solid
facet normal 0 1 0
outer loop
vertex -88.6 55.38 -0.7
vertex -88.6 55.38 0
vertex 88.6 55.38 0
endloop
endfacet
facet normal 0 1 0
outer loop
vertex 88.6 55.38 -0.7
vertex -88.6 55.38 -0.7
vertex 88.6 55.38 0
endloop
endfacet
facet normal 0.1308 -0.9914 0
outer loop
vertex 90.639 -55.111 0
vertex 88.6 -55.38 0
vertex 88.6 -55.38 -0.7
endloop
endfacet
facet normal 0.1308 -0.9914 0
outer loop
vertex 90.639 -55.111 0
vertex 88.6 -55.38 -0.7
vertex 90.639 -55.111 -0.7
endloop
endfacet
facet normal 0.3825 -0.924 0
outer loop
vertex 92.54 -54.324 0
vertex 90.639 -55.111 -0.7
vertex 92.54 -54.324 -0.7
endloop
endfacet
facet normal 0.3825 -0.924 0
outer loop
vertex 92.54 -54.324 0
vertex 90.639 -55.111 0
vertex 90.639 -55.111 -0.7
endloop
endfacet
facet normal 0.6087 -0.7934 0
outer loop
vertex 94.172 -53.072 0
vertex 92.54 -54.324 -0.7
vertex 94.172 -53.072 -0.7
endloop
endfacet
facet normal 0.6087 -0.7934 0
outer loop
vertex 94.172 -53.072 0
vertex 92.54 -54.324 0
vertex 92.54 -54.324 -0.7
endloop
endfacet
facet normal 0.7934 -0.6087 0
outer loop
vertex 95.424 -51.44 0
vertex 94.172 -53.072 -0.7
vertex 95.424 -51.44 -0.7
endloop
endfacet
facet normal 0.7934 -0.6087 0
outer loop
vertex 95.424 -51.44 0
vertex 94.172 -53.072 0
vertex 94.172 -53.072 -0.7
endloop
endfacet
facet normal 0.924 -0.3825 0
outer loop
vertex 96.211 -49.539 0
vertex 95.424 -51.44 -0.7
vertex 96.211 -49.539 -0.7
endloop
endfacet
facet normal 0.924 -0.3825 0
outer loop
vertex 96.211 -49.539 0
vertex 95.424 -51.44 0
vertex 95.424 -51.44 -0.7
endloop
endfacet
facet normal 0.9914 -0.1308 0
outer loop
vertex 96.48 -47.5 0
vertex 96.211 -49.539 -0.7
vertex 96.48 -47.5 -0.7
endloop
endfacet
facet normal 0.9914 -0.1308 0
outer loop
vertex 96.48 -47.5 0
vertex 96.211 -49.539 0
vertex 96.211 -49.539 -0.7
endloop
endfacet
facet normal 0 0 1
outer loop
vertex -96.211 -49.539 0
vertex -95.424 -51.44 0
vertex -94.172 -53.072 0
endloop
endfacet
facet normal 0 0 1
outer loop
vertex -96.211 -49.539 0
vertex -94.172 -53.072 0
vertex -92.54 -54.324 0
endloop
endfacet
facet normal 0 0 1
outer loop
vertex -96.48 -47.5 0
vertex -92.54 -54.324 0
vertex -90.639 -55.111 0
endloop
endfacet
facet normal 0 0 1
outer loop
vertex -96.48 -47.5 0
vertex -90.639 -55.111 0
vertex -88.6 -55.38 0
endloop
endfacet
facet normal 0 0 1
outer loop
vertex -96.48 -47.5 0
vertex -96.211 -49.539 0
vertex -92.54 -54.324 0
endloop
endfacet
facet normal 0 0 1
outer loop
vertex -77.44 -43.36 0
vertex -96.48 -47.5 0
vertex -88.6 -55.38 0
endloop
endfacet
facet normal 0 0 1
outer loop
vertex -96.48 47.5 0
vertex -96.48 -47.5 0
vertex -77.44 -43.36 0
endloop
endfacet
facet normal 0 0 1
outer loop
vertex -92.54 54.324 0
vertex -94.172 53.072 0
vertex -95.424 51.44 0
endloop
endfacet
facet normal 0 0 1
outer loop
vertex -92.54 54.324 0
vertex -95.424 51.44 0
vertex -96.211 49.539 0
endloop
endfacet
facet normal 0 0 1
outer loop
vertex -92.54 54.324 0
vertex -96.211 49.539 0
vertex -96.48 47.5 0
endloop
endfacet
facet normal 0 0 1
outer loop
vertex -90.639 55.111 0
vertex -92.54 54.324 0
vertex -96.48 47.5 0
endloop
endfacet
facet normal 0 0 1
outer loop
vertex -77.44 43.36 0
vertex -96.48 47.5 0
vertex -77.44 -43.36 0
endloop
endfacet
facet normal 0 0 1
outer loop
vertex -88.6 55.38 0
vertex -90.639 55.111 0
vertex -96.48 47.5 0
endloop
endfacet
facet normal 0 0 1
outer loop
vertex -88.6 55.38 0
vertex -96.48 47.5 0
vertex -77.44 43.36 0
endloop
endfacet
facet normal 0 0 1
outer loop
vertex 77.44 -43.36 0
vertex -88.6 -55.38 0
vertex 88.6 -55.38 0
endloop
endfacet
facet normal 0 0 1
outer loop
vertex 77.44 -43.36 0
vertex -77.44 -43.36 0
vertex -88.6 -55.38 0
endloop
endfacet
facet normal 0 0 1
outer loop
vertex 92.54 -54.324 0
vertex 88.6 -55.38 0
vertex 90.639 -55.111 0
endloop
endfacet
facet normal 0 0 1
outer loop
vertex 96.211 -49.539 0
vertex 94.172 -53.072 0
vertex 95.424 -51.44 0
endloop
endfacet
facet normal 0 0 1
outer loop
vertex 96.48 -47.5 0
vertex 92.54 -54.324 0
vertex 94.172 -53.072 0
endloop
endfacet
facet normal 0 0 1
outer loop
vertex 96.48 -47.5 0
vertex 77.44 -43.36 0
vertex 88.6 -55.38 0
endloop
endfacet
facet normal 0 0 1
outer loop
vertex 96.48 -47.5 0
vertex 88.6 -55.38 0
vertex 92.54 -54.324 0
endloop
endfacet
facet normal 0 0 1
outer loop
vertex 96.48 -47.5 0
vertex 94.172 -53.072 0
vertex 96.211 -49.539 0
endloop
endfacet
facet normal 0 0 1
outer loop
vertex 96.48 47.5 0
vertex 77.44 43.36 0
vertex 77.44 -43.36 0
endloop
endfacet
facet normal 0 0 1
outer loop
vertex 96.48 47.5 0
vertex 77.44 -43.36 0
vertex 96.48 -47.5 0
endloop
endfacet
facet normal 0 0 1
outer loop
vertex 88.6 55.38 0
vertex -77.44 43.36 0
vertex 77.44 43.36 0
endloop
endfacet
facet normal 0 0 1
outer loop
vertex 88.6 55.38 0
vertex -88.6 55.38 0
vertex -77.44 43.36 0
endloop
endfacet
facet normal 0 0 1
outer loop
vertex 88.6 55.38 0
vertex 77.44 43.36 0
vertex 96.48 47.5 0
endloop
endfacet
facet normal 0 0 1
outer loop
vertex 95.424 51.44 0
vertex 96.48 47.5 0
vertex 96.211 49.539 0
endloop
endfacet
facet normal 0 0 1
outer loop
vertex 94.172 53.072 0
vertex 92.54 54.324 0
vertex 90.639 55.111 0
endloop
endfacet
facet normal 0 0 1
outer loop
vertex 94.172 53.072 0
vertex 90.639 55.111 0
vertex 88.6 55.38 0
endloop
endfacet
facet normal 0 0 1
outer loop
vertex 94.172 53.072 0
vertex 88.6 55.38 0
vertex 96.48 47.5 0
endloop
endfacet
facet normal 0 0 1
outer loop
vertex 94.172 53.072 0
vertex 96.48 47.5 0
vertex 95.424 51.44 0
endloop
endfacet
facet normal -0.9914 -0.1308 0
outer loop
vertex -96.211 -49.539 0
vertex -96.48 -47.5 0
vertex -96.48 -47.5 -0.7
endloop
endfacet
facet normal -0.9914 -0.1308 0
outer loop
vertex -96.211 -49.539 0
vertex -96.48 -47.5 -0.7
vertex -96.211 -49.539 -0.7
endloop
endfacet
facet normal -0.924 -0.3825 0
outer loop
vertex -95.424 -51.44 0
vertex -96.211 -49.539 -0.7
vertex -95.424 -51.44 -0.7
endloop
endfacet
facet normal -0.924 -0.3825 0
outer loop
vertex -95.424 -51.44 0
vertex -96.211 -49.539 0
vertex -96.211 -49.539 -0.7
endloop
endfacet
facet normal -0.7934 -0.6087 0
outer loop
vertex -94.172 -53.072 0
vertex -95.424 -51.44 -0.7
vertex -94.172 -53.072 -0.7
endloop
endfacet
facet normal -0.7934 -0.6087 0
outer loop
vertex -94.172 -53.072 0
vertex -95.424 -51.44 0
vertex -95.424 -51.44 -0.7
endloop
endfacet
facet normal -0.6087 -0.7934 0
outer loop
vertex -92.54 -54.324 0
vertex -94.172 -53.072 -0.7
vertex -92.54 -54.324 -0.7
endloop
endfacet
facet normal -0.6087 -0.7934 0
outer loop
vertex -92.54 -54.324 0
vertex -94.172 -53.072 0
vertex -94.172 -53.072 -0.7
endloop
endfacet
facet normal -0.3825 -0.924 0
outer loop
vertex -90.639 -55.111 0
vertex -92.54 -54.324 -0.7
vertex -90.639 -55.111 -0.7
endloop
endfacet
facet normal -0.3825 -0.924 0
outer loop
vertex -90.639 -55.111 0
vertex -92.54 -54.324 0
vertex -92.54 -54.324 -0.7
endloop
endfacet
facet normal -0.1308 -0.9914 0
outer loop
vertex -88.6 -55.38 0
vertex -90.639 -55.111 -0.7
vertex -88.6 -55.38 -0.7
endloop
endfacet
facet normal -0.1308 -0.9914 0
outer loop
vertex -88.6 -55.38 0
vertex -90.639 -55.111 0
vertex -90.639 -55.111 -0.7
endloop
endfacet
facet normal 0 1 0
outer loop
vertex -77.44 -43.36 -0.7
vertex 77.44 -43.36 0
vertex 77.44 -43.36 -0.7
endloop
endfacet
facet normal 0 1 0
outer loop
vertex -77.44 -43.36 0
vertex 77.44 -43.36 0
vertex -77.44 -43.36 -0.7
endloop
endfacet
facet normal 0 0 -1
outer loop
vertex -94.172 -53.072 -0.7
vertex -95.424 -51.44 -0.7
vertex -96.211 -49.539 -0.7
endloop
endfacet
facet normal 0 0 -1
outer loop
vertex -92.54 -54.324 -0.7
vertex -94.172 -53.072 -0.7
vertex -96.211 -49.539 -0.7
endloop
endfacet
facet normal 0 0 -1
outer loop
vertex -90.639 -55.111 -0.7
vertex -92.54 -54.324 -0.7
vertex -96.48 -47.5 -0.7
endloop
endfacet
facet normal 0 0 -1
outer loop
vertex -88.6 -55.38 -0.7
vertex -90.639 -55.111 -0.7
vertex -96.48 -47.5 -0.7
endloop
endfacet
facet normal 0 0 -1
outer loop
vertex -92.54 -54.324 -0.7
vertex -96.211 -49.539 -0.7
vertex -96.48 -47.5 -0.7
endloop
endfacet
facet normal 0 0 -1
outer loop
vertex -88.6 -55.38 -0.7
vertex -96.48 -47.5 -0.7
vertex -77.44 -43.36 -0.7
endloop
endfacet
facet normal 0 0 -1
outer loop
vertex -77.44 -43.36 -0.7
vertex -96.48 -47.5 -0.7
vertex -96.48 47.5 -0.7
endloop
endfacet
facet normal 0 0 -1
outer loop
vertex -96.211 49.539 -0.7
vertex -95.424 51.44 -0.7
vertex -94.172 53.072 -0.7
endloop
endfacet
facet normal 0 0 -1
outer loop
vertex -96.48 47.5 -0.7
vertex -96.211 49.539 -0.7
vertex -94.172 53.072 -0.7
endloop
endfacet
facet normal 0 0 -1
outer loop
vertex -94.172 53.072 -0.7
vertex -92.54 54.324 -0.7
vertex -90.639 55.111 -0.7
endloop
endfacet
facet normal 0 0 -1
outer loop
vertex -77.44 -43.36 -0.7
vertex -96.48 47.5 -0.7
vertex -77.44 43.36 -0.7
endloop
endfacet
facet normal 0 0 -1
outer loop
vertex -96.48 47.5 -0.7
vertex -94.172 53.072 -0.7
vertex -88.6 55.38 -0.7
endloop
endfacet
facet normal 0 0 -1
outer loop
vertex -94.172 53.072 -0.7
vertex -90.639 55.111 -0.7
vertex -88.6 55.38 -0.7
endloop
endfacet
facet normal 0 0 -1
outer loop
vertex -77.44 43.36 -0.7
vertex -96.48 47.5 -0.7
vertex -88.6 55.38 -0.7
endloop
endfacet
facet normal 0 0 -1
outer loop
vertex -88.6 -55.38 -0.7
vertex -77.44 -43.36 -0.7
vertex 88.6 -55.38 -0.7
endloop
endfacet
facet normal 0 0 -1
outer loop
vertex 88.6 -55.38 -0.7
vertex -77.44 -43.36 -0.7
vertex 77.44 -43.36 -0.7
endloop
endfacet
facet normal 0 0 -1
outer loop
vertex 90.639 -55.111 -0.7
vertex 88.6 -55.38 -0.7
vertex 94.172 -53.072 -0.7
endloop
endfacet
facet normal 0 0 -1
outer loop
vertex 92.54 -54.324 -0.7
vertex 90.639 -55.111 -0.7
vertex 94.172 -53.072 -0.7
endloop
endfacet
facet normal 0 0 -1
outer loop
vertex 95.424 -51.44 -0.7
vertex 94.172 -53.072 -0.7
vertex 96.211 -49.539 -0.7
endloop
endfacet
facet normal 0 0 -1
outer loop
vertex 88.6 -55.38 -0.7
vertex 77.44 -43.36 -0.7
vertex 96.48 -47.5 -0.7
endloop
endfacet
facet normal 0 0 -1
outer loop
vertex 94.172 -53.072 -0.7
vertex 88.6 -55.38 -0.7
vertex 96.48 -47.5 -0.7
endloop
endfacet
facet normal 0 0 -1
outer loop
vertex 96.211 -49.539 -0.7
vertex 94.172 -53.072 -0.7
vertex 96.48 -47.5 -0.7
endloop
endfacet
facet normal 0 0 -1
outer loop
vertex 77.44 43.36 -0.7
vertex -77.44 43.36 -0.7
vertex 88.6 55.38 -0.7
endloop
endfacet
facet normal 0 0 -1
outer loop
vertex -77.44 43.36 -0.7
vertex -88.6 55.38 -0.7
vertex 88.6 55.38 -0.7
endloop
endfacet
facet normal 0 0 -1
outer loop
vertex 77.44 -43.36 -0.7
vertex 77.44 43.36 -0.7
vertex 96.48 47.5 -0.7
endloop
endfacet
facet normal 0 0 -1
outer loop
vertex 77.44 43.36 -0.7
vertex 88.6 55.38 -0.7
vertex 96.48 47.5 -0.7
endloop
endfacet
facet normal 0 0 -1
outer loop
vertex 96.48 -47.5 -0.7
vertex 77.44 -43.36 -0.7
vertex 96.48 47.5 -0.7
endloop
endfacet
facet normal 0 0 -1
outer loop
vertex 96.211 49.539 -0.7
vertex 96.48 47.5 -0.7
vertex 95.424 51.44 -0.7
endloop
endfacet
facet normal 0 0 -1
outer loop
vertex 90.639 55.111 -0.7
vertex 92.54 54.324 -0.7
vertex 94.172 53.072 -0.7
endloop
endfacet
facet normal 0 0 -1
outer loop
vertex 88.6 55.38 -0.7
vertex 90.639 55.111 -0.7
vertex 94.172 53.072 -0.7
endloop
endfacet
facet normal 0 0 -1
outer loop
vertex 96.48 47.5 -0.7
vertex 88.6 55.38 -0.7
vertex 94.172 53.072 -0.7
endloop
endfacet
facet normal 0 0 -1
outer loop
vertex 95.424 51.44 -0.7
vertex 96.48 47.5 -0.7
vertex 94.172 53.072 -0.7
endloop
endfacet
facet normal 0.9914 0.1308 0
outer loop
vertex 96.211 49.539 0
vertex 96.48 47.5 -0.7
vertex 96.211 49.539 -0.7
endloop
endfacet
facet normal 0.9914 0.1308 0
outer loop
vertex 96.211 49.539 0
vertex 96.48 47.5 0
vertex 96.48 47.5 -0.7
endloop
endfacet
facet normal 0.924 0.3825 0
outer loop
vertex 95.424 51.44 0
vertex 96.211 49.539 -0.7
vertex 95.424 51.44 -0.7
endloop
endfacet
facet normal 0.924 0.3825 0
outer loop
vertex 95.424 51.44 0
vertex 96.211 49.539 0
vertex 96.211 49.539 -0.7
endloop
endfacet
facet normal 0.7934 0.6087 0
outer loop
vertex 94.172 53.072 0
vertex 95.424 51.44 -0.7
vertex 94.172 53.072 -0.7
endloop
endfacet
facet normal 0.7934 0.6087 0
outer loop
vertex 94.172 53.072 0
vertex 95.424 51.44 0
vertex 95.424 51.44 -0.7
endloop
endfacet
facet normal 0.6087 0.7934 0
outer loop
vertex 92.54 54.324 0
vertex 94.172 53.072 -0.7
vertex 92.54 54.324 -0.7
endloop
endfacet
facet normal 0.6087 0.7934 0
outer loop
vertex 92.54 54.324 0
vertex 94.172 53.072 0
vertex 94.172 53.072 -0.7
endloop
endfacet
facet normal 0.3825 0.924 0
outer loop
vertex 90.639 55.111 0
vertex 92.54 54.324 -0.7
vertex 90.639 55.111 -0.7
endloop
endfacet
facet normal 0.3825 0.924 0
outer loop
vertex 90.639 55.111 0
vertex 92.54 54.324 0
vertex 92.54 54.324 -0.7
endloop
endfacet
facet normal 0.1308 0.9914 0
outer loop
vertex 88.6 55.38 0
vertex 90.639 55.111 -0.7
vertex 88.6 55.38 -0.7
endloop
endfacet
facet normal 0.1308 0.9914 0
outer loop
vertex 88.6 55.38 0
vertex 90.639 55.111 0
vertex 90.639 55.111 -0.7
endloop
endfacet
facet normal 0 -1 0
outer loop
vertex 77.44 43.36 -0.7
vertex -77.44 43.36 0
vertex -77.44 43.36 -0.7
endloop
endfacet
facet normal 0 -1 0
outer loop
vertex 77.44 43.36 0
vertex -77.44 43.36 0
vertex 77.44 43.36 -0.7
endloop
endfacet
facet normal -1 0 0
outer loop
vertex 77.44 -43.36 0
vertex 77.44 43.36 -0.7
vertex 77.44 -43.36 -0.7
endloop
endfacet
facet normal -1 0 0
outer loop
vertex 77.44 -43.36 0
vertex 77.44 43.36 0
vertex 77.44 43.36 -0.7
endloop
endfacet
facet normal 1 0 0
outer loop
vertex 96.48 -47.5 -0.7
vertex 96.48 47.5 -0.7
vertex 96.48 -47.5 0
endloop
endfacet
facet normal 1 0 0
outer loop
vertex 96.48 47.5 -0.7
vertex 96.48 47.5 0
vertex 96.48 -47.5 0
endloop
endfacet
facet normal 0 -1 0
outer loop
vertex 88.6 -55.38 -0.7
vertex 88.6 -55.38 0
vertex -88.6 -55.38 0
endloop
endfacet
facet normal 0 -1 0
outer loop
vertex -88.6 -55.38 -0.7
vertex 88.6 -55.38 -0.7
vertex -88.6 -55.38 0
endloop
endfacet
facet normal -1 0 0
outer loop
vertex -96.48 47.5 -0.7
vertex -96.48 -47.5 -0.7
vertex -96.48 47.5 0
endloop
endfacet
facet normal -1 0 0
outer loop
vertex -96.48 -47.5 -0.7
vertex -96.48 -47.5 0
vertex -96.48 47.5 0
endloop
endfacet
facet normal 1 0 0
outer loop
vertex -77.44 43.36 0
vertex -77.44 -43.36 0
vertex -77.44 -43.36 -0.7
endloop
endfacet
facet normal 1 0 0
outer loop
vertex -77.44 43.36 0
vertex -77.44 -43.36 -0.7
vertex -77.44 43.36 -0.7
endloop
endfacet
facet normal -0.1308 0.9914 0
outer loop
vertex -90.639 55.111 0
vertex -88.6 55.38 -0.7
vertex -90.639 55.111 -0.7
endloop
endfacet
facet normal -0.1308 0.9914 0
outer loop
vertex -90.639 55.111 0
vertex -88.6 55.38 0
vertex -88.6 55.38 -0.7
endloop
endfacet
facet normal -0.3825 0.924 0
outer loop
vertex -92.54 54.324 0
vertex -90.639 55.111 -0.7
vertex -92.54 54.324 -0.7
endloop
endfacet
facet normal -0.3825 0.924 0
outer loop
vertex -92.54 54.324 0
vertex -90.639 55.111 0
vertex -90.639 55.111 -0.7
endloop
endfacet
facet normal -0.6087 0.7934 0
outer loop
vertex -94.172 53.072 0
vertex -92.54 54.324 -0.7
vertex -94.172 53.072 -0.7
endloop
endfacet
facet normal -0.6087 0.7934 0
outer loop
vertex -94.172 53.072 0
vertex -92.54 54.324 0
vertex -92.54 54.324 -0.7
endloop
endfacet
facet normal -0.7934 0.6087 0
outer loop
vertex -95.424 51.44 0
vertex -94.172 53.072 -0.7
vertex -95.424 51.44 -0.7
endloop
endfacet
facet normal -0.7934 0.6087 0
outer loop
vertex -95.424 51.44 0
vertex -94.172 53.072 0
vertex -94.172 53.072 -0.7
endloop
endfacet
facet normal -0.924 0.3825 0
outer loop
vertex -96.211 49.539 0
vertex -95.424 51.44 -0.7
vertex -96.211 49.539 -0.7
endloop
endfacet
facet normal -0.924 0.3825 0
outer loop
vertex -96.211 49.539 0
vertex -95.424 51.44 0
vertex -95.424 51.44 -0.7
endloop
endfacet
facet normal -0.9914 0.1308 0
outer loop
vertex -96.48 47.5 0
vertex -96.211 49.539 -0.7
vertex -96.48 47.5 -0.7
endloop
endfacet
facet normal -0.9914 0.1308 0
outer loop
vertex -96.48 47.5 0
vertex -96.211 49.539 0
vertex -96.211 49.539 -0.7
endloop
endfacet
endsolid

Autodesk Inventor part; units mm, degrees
ref_plane "YZ Plane" through (0, 0, 0) normal (1, 0, 0) x (0, 1, 0)
ref_plane "XZ Plane" through (0, 0, 0) normal (0, 1, 0) x (-1, 0, 0)
ref_plane "XY Plane" through (0, 0, 0) normal (0, 0, 1) x (1, 0, 0)
sketch "Skizze1" plane through (0, 0, 0) normal (0, 0, 1) x (1, 0, 0)
  line L0 (-88.6, 55.38) -> (88.6, 55.38)
  line L1 (96.48, 47.5) -> (96.48, -47.5)
  line L2 (88.6, -55.38) -> (-88.6, -55.38)
  line L3 (-96.48, -47.5) -> (-96.48, 47.5)
  arc A0 (-88.6, 55.38) -> (-96.48, 47.5) centre (-88.6, 47.5) ccw
  arc A1 (-96.48, -47.5) -> (-88.6, -55.38) centre (-88.6, -47.5) ccw
  arc A2 (88.6, -55.38) -> (96.48, -47.5) centre (88.6, -47.5) ccw
  arc A3 (96.48, 47.5) -> (88.6, 55.38) centre (88.6, 47.5) ccw
  point P0 (0, 0)
  point P1 (96.48, -55.38)
  point P2 (96.48, 55.38)
  point P3 (-96.48, -55.38)
  point P4 (96.48, 0)
  point P5 (0, -55.38)
  dimension "d0" = 192.96
  dimension "d1" = 110.76
  dimension "d2" = 7.88
extrude "Extrusion1" add sketch "Skizze1" against normal blind 0.7
sketch "Skizze2" plane through (0, 0, 0) normal (0, 0, 1) x (1, 0, 0)
  line L0 (-77.44, 43.36) -> (77.44, 43.36)
  line L1 (77.44, 43.36) -> (77.44, -43.36)
  line L2 (77.44, -43.36) -> (-77.44, -43.36)
  line L3 (-77.44, -43.36) -> (-77.44, 43.36)
  point P0 (0, 0)
  point P1 (77.44, 0)
  point P2 (0, 43.36)
  dimension "d5" = 154.88
  dimension "d6" = 86.72
extrude "Extrusion2" cut sketch "Skizze2" against normal up to surface (0.7 mm away)
properties part number "Display Lens"
